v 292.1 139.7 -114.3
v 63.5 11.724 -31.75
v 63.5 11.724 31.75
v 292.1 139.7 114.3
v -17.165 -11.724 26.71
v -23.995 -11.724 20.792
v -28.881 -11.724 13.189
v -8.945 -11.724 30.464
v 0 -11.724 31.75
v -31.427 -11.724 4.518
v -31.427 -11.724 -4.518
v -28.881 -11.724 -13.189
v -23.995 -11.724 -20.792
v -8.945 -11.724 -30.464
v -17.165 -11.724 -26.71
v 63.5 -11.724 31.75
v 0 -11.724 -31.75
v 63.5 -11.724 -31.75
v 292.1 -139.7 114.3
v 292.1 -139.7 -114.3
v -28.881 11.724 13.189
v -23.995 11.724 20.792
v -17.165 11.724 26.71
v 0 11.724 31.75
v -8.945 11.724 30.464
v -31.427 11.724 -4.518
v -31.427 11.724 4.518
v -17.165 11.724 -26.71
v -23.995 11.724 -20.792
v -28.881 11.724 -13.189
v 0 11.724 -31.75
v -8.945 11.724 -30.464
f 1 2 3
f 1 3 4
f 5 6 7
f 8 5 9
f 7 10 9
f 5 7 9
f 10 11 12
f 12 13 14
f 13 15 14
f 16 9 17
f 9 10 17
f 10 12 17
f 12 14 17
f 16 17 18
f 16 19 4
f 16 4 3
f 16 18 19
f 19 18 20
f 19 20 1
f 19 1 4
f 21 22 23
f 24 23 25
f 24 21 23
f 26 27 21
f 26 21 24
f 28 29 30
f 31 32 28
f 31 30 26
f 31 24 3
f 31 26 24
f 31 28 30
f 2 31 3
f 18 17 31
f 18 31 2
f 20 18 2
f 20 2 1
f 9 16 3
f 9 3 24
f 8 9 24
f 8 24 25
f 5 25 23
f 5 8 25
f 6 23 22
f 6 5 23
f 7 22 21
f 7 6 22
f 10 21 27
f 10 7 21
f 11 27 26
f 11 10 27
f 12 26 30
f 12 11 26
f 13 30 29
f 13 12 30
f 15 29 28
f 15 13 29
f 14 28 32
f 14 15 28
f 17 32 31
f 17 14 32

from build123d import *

# Parameters (mm, degrees)
BOSS_EXTRUDE1_DEPTH      = 139.7
BOSS_EXTRUDE1_DEPTH_BACK = 139.7
CUT_EXTRUDE1_DEPTH       = 139.7
CUT_EXTRUDE1_DEPTH_BACK  = 139.7


with BuildPart() as part:
    # Sketch1 → Boss-Extrude1 (new, two sides: drawn at the far end of the back side and taken through both)
    with BuildSketch(Plane(origin=(0, 0, 0), x_dir=(1, 0, 0), z_dir=(0, 1, 0)).offset(-BOSS_EXTRUDE1_DEPTH_BACK)):
        with BuildLine():
            Line((0, 31.75), (63.5, 31.75))
            Line((63.5, 31.75), (292.1, 114.3))
            Line((292.1, 114.3), (292.1, -114.3))
            Line((292.1, -114.3), (63.5, -31.75))
            Line((63.5, -31.75), (0, -31.75))
            ThreePointArc((0, -31.75), (-31.75, 0), (0, 31.75))
        make_face()
    extrude(amount=BOSS_EXTRUDE1_DEPTH + BOSS_EXTRUDE1_DEPTH_BACK)

    # Sketch2 → Cut-Extrude1 (cut, two sides: drawn at the far end of the back side and taken through both)
    with BuildSketch(Plane.XY.offset(-CUT_EXTRUDE1_DEPTH_BACK)):
        Polygon((-31.75, 11.723949014), (63.5, 11.723949014), (292.1, 139.7), (-31.75, 139.7), align=None)
        Polygon((63.5, -11.723949014), (292.1, -139.7), (-31.75, -139.7), (-31.75, -11.723949014), align=None)
    extrude(amount=CUT_EXTRUDE1_DEPTH + CUT_EXTRUDE1_DEPTH_BACK, mode=Mode.SUBTRACT)


solid = part.part
